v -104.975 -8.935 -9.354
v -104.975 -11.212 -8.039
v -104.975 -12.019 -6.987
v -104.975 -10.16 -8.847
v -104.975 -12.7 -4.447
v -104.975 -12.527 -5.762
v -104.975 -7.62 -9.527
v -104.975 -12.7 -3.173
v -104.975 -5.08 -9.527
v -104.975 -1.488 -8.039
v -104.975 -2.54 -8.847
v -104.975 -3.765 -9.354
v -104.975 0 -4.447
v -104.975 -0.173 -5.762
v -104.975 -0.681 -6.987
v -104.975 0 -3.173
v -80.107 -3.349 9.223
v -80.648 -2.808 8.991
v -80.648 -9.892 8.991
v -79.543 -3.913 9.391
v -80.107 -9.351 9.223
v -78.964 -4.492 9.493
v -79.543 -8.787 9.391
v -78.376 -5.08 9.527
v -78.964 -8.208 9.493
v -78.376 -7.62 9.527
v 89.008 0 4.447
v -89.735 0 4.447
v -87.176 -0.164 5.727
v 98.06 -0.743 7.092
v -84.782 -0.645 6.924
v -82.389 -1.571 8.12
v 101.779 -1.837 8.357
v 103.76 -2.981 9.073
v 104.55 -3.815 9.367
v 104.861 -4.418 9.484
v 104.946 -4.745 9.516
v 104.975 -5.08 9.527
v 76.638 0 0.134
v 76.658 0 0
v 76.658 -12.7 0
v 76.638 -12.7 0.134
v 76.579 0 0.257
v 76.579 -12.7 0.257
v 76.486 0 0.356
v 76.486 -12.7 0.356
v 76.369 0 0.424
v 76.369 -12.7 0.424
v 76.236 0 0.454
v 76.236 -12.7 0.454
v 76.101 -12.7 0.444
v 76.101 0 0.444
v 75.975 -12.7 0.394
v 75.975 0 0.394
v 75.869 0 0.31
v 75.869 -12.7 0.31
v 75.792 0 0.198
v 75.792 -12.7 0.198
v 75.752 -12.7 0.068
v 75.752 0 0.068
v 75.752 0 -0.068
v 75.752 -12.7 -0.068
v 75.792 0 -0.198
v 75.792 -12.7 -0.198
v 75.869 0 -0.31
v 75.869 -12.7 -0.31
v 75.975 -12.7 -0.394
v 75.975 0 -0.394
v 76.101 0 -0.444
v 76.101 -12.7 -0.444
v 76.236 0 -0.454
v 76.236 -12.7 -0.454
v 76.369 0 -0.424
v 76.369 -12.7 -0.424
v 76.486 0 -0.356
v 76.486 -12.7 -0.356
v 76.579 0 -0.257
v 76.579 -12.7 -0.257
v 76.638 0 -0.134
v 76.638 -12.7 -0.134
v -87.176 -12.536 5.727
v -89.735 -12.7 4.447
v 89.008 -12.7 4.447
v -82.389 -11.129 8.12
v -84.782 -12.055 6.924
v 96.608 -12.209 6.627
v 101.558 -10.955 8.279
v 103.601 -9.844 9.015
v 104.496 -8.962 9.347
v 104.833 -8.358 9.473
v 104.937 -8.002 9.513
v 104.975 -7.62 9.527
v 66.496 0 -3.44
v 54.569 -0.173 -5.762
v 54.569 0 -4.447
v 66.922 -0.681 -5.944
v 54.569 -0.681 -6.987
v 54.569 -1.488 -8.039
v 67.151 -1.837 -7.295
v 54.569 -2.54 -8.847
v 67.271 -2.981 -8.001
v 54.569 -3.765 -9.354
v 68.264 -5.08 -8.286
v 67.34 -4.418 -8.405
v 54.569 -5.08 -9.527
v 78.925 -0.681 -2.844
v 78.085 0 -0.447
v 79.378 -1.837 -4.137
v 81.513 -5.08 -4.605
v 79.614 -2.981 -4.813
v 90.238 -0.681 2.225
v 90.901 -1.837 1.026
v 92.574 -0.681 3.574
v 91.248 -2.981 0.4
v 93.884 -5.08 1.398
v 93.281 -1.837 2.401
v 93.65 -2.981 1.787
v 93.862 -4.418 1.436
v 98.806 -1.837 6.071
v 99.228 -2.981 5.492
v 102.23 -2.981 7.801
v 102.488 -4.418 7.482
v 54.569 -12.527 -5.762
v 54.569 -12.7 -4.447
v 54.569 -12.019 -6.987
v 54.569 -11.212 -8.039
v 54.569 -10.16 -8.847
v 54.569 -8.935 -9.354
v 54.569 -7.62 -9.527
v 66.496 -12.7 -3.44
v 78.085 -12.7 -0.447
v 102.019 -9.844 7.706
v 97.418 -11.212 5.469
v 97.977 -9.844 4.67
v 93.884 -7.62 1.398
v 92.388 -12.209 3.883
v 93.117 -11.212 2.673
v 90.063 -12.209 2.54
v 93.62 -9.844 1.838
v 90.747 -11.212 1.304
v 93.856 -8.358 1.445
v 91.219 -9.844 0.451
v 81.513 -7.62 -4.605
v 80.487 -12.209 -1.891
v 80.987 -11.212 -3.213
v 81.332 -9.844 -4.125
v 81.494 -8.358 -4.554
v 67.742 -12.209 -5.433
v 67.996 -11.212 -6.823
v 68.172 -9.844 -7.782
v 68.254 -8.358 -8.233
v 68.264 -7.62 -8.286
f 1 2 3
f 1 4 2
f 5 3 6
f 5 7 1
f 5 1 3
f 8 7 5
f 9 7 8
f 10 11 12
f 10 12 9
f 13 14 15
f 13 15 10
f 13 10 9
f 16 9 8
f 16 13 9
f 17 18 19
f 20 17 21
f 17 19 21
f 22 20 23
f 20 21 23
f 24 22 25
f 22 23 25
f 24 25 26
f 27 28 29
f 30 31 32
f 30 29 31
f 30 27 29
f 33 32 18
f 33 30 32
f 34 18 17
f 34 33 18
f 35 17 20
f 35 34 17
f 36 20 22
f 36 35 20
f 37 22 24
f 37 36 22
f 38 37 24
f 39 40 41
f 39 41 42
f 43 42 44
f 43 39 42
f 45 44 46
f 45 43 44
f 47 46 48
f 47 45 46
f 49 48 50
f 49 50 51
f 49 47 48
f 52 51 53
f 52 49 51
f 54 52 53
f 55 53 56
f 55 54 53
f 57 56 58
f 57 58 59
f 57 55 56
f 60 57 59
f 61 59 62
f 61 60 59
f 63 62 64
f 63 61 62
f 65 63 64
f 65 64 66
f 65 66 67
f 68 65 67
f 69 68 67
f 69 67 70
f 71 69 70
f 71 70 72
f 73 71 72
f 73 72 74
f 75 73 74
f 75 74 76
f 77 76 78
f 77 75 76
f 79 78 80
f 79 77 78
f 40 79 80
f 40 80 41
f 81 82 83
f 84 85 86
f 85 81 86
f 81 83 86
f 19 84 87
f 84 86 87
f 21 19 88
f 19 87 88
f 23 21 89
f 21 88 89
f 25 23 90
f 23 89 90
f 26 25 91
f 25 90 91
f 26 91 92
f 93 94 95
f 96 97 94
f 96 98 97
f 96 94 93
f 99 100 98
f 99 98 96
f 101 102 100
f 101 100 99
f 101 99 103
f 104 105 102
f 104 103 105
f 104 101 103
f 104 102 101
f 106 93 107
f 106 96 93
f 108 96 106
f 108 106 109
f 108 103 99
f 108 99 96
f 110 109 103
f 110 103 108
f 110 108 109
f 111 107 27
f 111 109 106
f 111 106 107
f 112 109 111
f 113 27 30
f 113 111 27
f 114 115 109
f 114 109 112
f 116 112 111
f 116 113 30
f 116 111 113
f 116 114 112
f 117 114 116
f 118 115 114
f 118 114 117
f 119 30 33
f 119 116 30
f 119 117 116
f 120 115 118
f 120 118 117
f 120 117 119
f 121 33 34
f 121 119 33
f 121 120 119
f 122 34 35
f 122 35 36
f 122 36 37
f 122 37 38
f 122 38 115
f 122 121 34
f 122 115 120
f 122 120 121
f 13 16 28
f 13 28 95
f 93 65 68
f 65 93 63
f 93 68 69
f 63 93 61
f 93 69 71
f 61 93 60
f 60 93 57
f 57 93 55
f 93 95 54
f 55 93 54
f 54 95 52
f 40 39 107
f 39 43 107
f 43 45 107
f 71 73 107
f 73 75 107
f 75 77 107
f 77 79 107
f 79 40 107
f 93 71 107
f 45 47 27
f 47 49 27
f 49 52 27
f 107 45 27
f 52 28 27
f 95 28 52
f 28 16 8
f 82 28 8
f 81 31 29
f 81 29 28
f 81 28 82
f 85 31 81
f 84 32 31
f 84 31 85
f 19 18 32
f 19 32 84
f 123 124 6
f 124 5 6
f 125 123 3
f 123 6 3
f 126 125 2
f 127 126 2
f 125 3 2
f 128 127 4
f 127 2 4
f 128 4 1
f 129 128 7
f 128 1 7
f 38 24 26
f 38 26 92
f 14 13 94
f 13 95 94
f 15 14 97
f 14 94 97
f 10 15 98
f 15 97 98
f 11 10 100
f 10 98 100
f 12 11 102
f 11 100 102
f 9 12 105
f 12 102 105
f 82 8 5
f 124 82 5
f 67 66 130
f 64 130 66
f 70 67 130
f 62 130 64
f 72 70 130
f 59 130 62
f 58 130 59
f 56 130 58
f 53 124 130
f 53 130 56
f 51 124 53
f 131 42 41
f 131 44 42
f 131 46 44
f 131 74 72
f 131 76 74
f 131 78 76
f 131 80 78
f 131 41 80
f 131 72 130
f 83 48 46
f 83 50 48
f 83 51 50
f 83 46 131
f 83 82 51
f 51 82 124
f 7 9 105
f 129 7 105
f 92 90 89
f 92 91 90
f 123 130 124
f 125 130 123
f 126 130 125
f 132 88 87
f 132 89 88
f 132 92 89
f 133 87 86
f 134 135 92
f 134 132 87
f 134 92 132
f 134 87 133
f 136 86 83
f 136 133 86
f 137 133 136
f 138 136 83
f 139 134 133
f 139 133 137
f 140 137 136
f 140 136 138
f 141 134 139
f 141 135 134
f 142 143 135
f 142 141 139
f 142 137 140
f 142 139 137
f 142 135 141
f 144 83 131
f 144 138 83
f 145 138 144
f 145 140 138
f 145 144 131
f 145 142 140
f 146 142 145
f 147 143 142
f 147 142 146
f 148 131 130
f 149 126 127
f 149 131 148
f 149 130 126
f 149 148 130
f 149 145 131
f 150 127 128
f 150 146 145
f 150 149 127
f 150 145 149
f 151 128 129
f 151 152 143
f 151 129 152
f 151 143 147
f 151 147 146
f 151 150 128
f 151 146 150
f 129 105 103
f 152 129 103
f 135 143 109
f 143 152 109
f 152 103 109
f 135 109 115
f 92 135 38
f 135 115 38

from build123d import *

# Parameters (mm, degrees)
F0_W        = 209.9508528371
F0_H        = 19.0544301776
F0_R        = 0.4554012186
F1_DEPTH    = 12.7
F2_T1_DEPTH = 264.7329269001
F3_SIZE2    = 25.4
F3_SIZE     = 12.7
F4_R        = 5.08


# Not quite as in the source:
# - a fillet or chamfer that OpenCascade refuses, or shapes differently, is made with other operations: its cross-section is extruded or revolved along the edge and cut away or added


with BuildPart() as f1:
    # F0 (on Front) → F1 (new body)
    with BuildSketch(Plane.XZ):
        Rectangle(F0_W, F0_H)
        with Locations((76.2023702264, 0)):
            Circle(F0_R, mode=Mode.SUBTRACT)
    extrude(amount=F1_DEPTH)

    # F2: fillet of radius 76.2 on 1 edges, made by hand

    # F2_s2 → F2_t1 (cut)
    with BuildSketch(Plane.XZ.offset(-126.0164634501)):
        with BuildLine():
            ThreePointArc((54.5688410385, -9.5272150888), (81.5127418283, -4.6046042822), (104.9754264186, 9.5272150888))
            Line((104.9754264186, 9.5272150888), (104.9754264186, -9.5272150888))
            Line((104.9754264186, -9.5272150888), (54.5688410385, -9.5272150888))
        make_face()
    extrude(amount=F2_T1_DEPTH, mode=Mode.SUBTRACT)

    # F3
    f3_edges = [f1.edges().sort_by_distance(p)[0] for p in [
        (-104.975426, -6.35, 9.527215),
    ]]
    f3_side = f1.faces().sort_by_distance((-104.975426, -6.35, 0))[0]
    chamfer(f3_edges, length=F3_SIZE, length2=F3_SIZE2, reference=f3_side)

    # F4
    f4_edges = [f1.edges().sort_by_distance(p)[0] for p in [
        (81.512742, -12.7, -4.604604),
        (12.7, -12.7, 9.527215),
        (12.7, 0, 9.527215),
        (-25.203293, 0, -9.527215),
        (-79.575426, -6.35, 9.527215),
        (-25.203293, -12.7, -9.527215),
        (81.512742, 0, -4.604604),
    ]]
    fillet(f4_edges, radius=F4_R)


solid = f1.part
